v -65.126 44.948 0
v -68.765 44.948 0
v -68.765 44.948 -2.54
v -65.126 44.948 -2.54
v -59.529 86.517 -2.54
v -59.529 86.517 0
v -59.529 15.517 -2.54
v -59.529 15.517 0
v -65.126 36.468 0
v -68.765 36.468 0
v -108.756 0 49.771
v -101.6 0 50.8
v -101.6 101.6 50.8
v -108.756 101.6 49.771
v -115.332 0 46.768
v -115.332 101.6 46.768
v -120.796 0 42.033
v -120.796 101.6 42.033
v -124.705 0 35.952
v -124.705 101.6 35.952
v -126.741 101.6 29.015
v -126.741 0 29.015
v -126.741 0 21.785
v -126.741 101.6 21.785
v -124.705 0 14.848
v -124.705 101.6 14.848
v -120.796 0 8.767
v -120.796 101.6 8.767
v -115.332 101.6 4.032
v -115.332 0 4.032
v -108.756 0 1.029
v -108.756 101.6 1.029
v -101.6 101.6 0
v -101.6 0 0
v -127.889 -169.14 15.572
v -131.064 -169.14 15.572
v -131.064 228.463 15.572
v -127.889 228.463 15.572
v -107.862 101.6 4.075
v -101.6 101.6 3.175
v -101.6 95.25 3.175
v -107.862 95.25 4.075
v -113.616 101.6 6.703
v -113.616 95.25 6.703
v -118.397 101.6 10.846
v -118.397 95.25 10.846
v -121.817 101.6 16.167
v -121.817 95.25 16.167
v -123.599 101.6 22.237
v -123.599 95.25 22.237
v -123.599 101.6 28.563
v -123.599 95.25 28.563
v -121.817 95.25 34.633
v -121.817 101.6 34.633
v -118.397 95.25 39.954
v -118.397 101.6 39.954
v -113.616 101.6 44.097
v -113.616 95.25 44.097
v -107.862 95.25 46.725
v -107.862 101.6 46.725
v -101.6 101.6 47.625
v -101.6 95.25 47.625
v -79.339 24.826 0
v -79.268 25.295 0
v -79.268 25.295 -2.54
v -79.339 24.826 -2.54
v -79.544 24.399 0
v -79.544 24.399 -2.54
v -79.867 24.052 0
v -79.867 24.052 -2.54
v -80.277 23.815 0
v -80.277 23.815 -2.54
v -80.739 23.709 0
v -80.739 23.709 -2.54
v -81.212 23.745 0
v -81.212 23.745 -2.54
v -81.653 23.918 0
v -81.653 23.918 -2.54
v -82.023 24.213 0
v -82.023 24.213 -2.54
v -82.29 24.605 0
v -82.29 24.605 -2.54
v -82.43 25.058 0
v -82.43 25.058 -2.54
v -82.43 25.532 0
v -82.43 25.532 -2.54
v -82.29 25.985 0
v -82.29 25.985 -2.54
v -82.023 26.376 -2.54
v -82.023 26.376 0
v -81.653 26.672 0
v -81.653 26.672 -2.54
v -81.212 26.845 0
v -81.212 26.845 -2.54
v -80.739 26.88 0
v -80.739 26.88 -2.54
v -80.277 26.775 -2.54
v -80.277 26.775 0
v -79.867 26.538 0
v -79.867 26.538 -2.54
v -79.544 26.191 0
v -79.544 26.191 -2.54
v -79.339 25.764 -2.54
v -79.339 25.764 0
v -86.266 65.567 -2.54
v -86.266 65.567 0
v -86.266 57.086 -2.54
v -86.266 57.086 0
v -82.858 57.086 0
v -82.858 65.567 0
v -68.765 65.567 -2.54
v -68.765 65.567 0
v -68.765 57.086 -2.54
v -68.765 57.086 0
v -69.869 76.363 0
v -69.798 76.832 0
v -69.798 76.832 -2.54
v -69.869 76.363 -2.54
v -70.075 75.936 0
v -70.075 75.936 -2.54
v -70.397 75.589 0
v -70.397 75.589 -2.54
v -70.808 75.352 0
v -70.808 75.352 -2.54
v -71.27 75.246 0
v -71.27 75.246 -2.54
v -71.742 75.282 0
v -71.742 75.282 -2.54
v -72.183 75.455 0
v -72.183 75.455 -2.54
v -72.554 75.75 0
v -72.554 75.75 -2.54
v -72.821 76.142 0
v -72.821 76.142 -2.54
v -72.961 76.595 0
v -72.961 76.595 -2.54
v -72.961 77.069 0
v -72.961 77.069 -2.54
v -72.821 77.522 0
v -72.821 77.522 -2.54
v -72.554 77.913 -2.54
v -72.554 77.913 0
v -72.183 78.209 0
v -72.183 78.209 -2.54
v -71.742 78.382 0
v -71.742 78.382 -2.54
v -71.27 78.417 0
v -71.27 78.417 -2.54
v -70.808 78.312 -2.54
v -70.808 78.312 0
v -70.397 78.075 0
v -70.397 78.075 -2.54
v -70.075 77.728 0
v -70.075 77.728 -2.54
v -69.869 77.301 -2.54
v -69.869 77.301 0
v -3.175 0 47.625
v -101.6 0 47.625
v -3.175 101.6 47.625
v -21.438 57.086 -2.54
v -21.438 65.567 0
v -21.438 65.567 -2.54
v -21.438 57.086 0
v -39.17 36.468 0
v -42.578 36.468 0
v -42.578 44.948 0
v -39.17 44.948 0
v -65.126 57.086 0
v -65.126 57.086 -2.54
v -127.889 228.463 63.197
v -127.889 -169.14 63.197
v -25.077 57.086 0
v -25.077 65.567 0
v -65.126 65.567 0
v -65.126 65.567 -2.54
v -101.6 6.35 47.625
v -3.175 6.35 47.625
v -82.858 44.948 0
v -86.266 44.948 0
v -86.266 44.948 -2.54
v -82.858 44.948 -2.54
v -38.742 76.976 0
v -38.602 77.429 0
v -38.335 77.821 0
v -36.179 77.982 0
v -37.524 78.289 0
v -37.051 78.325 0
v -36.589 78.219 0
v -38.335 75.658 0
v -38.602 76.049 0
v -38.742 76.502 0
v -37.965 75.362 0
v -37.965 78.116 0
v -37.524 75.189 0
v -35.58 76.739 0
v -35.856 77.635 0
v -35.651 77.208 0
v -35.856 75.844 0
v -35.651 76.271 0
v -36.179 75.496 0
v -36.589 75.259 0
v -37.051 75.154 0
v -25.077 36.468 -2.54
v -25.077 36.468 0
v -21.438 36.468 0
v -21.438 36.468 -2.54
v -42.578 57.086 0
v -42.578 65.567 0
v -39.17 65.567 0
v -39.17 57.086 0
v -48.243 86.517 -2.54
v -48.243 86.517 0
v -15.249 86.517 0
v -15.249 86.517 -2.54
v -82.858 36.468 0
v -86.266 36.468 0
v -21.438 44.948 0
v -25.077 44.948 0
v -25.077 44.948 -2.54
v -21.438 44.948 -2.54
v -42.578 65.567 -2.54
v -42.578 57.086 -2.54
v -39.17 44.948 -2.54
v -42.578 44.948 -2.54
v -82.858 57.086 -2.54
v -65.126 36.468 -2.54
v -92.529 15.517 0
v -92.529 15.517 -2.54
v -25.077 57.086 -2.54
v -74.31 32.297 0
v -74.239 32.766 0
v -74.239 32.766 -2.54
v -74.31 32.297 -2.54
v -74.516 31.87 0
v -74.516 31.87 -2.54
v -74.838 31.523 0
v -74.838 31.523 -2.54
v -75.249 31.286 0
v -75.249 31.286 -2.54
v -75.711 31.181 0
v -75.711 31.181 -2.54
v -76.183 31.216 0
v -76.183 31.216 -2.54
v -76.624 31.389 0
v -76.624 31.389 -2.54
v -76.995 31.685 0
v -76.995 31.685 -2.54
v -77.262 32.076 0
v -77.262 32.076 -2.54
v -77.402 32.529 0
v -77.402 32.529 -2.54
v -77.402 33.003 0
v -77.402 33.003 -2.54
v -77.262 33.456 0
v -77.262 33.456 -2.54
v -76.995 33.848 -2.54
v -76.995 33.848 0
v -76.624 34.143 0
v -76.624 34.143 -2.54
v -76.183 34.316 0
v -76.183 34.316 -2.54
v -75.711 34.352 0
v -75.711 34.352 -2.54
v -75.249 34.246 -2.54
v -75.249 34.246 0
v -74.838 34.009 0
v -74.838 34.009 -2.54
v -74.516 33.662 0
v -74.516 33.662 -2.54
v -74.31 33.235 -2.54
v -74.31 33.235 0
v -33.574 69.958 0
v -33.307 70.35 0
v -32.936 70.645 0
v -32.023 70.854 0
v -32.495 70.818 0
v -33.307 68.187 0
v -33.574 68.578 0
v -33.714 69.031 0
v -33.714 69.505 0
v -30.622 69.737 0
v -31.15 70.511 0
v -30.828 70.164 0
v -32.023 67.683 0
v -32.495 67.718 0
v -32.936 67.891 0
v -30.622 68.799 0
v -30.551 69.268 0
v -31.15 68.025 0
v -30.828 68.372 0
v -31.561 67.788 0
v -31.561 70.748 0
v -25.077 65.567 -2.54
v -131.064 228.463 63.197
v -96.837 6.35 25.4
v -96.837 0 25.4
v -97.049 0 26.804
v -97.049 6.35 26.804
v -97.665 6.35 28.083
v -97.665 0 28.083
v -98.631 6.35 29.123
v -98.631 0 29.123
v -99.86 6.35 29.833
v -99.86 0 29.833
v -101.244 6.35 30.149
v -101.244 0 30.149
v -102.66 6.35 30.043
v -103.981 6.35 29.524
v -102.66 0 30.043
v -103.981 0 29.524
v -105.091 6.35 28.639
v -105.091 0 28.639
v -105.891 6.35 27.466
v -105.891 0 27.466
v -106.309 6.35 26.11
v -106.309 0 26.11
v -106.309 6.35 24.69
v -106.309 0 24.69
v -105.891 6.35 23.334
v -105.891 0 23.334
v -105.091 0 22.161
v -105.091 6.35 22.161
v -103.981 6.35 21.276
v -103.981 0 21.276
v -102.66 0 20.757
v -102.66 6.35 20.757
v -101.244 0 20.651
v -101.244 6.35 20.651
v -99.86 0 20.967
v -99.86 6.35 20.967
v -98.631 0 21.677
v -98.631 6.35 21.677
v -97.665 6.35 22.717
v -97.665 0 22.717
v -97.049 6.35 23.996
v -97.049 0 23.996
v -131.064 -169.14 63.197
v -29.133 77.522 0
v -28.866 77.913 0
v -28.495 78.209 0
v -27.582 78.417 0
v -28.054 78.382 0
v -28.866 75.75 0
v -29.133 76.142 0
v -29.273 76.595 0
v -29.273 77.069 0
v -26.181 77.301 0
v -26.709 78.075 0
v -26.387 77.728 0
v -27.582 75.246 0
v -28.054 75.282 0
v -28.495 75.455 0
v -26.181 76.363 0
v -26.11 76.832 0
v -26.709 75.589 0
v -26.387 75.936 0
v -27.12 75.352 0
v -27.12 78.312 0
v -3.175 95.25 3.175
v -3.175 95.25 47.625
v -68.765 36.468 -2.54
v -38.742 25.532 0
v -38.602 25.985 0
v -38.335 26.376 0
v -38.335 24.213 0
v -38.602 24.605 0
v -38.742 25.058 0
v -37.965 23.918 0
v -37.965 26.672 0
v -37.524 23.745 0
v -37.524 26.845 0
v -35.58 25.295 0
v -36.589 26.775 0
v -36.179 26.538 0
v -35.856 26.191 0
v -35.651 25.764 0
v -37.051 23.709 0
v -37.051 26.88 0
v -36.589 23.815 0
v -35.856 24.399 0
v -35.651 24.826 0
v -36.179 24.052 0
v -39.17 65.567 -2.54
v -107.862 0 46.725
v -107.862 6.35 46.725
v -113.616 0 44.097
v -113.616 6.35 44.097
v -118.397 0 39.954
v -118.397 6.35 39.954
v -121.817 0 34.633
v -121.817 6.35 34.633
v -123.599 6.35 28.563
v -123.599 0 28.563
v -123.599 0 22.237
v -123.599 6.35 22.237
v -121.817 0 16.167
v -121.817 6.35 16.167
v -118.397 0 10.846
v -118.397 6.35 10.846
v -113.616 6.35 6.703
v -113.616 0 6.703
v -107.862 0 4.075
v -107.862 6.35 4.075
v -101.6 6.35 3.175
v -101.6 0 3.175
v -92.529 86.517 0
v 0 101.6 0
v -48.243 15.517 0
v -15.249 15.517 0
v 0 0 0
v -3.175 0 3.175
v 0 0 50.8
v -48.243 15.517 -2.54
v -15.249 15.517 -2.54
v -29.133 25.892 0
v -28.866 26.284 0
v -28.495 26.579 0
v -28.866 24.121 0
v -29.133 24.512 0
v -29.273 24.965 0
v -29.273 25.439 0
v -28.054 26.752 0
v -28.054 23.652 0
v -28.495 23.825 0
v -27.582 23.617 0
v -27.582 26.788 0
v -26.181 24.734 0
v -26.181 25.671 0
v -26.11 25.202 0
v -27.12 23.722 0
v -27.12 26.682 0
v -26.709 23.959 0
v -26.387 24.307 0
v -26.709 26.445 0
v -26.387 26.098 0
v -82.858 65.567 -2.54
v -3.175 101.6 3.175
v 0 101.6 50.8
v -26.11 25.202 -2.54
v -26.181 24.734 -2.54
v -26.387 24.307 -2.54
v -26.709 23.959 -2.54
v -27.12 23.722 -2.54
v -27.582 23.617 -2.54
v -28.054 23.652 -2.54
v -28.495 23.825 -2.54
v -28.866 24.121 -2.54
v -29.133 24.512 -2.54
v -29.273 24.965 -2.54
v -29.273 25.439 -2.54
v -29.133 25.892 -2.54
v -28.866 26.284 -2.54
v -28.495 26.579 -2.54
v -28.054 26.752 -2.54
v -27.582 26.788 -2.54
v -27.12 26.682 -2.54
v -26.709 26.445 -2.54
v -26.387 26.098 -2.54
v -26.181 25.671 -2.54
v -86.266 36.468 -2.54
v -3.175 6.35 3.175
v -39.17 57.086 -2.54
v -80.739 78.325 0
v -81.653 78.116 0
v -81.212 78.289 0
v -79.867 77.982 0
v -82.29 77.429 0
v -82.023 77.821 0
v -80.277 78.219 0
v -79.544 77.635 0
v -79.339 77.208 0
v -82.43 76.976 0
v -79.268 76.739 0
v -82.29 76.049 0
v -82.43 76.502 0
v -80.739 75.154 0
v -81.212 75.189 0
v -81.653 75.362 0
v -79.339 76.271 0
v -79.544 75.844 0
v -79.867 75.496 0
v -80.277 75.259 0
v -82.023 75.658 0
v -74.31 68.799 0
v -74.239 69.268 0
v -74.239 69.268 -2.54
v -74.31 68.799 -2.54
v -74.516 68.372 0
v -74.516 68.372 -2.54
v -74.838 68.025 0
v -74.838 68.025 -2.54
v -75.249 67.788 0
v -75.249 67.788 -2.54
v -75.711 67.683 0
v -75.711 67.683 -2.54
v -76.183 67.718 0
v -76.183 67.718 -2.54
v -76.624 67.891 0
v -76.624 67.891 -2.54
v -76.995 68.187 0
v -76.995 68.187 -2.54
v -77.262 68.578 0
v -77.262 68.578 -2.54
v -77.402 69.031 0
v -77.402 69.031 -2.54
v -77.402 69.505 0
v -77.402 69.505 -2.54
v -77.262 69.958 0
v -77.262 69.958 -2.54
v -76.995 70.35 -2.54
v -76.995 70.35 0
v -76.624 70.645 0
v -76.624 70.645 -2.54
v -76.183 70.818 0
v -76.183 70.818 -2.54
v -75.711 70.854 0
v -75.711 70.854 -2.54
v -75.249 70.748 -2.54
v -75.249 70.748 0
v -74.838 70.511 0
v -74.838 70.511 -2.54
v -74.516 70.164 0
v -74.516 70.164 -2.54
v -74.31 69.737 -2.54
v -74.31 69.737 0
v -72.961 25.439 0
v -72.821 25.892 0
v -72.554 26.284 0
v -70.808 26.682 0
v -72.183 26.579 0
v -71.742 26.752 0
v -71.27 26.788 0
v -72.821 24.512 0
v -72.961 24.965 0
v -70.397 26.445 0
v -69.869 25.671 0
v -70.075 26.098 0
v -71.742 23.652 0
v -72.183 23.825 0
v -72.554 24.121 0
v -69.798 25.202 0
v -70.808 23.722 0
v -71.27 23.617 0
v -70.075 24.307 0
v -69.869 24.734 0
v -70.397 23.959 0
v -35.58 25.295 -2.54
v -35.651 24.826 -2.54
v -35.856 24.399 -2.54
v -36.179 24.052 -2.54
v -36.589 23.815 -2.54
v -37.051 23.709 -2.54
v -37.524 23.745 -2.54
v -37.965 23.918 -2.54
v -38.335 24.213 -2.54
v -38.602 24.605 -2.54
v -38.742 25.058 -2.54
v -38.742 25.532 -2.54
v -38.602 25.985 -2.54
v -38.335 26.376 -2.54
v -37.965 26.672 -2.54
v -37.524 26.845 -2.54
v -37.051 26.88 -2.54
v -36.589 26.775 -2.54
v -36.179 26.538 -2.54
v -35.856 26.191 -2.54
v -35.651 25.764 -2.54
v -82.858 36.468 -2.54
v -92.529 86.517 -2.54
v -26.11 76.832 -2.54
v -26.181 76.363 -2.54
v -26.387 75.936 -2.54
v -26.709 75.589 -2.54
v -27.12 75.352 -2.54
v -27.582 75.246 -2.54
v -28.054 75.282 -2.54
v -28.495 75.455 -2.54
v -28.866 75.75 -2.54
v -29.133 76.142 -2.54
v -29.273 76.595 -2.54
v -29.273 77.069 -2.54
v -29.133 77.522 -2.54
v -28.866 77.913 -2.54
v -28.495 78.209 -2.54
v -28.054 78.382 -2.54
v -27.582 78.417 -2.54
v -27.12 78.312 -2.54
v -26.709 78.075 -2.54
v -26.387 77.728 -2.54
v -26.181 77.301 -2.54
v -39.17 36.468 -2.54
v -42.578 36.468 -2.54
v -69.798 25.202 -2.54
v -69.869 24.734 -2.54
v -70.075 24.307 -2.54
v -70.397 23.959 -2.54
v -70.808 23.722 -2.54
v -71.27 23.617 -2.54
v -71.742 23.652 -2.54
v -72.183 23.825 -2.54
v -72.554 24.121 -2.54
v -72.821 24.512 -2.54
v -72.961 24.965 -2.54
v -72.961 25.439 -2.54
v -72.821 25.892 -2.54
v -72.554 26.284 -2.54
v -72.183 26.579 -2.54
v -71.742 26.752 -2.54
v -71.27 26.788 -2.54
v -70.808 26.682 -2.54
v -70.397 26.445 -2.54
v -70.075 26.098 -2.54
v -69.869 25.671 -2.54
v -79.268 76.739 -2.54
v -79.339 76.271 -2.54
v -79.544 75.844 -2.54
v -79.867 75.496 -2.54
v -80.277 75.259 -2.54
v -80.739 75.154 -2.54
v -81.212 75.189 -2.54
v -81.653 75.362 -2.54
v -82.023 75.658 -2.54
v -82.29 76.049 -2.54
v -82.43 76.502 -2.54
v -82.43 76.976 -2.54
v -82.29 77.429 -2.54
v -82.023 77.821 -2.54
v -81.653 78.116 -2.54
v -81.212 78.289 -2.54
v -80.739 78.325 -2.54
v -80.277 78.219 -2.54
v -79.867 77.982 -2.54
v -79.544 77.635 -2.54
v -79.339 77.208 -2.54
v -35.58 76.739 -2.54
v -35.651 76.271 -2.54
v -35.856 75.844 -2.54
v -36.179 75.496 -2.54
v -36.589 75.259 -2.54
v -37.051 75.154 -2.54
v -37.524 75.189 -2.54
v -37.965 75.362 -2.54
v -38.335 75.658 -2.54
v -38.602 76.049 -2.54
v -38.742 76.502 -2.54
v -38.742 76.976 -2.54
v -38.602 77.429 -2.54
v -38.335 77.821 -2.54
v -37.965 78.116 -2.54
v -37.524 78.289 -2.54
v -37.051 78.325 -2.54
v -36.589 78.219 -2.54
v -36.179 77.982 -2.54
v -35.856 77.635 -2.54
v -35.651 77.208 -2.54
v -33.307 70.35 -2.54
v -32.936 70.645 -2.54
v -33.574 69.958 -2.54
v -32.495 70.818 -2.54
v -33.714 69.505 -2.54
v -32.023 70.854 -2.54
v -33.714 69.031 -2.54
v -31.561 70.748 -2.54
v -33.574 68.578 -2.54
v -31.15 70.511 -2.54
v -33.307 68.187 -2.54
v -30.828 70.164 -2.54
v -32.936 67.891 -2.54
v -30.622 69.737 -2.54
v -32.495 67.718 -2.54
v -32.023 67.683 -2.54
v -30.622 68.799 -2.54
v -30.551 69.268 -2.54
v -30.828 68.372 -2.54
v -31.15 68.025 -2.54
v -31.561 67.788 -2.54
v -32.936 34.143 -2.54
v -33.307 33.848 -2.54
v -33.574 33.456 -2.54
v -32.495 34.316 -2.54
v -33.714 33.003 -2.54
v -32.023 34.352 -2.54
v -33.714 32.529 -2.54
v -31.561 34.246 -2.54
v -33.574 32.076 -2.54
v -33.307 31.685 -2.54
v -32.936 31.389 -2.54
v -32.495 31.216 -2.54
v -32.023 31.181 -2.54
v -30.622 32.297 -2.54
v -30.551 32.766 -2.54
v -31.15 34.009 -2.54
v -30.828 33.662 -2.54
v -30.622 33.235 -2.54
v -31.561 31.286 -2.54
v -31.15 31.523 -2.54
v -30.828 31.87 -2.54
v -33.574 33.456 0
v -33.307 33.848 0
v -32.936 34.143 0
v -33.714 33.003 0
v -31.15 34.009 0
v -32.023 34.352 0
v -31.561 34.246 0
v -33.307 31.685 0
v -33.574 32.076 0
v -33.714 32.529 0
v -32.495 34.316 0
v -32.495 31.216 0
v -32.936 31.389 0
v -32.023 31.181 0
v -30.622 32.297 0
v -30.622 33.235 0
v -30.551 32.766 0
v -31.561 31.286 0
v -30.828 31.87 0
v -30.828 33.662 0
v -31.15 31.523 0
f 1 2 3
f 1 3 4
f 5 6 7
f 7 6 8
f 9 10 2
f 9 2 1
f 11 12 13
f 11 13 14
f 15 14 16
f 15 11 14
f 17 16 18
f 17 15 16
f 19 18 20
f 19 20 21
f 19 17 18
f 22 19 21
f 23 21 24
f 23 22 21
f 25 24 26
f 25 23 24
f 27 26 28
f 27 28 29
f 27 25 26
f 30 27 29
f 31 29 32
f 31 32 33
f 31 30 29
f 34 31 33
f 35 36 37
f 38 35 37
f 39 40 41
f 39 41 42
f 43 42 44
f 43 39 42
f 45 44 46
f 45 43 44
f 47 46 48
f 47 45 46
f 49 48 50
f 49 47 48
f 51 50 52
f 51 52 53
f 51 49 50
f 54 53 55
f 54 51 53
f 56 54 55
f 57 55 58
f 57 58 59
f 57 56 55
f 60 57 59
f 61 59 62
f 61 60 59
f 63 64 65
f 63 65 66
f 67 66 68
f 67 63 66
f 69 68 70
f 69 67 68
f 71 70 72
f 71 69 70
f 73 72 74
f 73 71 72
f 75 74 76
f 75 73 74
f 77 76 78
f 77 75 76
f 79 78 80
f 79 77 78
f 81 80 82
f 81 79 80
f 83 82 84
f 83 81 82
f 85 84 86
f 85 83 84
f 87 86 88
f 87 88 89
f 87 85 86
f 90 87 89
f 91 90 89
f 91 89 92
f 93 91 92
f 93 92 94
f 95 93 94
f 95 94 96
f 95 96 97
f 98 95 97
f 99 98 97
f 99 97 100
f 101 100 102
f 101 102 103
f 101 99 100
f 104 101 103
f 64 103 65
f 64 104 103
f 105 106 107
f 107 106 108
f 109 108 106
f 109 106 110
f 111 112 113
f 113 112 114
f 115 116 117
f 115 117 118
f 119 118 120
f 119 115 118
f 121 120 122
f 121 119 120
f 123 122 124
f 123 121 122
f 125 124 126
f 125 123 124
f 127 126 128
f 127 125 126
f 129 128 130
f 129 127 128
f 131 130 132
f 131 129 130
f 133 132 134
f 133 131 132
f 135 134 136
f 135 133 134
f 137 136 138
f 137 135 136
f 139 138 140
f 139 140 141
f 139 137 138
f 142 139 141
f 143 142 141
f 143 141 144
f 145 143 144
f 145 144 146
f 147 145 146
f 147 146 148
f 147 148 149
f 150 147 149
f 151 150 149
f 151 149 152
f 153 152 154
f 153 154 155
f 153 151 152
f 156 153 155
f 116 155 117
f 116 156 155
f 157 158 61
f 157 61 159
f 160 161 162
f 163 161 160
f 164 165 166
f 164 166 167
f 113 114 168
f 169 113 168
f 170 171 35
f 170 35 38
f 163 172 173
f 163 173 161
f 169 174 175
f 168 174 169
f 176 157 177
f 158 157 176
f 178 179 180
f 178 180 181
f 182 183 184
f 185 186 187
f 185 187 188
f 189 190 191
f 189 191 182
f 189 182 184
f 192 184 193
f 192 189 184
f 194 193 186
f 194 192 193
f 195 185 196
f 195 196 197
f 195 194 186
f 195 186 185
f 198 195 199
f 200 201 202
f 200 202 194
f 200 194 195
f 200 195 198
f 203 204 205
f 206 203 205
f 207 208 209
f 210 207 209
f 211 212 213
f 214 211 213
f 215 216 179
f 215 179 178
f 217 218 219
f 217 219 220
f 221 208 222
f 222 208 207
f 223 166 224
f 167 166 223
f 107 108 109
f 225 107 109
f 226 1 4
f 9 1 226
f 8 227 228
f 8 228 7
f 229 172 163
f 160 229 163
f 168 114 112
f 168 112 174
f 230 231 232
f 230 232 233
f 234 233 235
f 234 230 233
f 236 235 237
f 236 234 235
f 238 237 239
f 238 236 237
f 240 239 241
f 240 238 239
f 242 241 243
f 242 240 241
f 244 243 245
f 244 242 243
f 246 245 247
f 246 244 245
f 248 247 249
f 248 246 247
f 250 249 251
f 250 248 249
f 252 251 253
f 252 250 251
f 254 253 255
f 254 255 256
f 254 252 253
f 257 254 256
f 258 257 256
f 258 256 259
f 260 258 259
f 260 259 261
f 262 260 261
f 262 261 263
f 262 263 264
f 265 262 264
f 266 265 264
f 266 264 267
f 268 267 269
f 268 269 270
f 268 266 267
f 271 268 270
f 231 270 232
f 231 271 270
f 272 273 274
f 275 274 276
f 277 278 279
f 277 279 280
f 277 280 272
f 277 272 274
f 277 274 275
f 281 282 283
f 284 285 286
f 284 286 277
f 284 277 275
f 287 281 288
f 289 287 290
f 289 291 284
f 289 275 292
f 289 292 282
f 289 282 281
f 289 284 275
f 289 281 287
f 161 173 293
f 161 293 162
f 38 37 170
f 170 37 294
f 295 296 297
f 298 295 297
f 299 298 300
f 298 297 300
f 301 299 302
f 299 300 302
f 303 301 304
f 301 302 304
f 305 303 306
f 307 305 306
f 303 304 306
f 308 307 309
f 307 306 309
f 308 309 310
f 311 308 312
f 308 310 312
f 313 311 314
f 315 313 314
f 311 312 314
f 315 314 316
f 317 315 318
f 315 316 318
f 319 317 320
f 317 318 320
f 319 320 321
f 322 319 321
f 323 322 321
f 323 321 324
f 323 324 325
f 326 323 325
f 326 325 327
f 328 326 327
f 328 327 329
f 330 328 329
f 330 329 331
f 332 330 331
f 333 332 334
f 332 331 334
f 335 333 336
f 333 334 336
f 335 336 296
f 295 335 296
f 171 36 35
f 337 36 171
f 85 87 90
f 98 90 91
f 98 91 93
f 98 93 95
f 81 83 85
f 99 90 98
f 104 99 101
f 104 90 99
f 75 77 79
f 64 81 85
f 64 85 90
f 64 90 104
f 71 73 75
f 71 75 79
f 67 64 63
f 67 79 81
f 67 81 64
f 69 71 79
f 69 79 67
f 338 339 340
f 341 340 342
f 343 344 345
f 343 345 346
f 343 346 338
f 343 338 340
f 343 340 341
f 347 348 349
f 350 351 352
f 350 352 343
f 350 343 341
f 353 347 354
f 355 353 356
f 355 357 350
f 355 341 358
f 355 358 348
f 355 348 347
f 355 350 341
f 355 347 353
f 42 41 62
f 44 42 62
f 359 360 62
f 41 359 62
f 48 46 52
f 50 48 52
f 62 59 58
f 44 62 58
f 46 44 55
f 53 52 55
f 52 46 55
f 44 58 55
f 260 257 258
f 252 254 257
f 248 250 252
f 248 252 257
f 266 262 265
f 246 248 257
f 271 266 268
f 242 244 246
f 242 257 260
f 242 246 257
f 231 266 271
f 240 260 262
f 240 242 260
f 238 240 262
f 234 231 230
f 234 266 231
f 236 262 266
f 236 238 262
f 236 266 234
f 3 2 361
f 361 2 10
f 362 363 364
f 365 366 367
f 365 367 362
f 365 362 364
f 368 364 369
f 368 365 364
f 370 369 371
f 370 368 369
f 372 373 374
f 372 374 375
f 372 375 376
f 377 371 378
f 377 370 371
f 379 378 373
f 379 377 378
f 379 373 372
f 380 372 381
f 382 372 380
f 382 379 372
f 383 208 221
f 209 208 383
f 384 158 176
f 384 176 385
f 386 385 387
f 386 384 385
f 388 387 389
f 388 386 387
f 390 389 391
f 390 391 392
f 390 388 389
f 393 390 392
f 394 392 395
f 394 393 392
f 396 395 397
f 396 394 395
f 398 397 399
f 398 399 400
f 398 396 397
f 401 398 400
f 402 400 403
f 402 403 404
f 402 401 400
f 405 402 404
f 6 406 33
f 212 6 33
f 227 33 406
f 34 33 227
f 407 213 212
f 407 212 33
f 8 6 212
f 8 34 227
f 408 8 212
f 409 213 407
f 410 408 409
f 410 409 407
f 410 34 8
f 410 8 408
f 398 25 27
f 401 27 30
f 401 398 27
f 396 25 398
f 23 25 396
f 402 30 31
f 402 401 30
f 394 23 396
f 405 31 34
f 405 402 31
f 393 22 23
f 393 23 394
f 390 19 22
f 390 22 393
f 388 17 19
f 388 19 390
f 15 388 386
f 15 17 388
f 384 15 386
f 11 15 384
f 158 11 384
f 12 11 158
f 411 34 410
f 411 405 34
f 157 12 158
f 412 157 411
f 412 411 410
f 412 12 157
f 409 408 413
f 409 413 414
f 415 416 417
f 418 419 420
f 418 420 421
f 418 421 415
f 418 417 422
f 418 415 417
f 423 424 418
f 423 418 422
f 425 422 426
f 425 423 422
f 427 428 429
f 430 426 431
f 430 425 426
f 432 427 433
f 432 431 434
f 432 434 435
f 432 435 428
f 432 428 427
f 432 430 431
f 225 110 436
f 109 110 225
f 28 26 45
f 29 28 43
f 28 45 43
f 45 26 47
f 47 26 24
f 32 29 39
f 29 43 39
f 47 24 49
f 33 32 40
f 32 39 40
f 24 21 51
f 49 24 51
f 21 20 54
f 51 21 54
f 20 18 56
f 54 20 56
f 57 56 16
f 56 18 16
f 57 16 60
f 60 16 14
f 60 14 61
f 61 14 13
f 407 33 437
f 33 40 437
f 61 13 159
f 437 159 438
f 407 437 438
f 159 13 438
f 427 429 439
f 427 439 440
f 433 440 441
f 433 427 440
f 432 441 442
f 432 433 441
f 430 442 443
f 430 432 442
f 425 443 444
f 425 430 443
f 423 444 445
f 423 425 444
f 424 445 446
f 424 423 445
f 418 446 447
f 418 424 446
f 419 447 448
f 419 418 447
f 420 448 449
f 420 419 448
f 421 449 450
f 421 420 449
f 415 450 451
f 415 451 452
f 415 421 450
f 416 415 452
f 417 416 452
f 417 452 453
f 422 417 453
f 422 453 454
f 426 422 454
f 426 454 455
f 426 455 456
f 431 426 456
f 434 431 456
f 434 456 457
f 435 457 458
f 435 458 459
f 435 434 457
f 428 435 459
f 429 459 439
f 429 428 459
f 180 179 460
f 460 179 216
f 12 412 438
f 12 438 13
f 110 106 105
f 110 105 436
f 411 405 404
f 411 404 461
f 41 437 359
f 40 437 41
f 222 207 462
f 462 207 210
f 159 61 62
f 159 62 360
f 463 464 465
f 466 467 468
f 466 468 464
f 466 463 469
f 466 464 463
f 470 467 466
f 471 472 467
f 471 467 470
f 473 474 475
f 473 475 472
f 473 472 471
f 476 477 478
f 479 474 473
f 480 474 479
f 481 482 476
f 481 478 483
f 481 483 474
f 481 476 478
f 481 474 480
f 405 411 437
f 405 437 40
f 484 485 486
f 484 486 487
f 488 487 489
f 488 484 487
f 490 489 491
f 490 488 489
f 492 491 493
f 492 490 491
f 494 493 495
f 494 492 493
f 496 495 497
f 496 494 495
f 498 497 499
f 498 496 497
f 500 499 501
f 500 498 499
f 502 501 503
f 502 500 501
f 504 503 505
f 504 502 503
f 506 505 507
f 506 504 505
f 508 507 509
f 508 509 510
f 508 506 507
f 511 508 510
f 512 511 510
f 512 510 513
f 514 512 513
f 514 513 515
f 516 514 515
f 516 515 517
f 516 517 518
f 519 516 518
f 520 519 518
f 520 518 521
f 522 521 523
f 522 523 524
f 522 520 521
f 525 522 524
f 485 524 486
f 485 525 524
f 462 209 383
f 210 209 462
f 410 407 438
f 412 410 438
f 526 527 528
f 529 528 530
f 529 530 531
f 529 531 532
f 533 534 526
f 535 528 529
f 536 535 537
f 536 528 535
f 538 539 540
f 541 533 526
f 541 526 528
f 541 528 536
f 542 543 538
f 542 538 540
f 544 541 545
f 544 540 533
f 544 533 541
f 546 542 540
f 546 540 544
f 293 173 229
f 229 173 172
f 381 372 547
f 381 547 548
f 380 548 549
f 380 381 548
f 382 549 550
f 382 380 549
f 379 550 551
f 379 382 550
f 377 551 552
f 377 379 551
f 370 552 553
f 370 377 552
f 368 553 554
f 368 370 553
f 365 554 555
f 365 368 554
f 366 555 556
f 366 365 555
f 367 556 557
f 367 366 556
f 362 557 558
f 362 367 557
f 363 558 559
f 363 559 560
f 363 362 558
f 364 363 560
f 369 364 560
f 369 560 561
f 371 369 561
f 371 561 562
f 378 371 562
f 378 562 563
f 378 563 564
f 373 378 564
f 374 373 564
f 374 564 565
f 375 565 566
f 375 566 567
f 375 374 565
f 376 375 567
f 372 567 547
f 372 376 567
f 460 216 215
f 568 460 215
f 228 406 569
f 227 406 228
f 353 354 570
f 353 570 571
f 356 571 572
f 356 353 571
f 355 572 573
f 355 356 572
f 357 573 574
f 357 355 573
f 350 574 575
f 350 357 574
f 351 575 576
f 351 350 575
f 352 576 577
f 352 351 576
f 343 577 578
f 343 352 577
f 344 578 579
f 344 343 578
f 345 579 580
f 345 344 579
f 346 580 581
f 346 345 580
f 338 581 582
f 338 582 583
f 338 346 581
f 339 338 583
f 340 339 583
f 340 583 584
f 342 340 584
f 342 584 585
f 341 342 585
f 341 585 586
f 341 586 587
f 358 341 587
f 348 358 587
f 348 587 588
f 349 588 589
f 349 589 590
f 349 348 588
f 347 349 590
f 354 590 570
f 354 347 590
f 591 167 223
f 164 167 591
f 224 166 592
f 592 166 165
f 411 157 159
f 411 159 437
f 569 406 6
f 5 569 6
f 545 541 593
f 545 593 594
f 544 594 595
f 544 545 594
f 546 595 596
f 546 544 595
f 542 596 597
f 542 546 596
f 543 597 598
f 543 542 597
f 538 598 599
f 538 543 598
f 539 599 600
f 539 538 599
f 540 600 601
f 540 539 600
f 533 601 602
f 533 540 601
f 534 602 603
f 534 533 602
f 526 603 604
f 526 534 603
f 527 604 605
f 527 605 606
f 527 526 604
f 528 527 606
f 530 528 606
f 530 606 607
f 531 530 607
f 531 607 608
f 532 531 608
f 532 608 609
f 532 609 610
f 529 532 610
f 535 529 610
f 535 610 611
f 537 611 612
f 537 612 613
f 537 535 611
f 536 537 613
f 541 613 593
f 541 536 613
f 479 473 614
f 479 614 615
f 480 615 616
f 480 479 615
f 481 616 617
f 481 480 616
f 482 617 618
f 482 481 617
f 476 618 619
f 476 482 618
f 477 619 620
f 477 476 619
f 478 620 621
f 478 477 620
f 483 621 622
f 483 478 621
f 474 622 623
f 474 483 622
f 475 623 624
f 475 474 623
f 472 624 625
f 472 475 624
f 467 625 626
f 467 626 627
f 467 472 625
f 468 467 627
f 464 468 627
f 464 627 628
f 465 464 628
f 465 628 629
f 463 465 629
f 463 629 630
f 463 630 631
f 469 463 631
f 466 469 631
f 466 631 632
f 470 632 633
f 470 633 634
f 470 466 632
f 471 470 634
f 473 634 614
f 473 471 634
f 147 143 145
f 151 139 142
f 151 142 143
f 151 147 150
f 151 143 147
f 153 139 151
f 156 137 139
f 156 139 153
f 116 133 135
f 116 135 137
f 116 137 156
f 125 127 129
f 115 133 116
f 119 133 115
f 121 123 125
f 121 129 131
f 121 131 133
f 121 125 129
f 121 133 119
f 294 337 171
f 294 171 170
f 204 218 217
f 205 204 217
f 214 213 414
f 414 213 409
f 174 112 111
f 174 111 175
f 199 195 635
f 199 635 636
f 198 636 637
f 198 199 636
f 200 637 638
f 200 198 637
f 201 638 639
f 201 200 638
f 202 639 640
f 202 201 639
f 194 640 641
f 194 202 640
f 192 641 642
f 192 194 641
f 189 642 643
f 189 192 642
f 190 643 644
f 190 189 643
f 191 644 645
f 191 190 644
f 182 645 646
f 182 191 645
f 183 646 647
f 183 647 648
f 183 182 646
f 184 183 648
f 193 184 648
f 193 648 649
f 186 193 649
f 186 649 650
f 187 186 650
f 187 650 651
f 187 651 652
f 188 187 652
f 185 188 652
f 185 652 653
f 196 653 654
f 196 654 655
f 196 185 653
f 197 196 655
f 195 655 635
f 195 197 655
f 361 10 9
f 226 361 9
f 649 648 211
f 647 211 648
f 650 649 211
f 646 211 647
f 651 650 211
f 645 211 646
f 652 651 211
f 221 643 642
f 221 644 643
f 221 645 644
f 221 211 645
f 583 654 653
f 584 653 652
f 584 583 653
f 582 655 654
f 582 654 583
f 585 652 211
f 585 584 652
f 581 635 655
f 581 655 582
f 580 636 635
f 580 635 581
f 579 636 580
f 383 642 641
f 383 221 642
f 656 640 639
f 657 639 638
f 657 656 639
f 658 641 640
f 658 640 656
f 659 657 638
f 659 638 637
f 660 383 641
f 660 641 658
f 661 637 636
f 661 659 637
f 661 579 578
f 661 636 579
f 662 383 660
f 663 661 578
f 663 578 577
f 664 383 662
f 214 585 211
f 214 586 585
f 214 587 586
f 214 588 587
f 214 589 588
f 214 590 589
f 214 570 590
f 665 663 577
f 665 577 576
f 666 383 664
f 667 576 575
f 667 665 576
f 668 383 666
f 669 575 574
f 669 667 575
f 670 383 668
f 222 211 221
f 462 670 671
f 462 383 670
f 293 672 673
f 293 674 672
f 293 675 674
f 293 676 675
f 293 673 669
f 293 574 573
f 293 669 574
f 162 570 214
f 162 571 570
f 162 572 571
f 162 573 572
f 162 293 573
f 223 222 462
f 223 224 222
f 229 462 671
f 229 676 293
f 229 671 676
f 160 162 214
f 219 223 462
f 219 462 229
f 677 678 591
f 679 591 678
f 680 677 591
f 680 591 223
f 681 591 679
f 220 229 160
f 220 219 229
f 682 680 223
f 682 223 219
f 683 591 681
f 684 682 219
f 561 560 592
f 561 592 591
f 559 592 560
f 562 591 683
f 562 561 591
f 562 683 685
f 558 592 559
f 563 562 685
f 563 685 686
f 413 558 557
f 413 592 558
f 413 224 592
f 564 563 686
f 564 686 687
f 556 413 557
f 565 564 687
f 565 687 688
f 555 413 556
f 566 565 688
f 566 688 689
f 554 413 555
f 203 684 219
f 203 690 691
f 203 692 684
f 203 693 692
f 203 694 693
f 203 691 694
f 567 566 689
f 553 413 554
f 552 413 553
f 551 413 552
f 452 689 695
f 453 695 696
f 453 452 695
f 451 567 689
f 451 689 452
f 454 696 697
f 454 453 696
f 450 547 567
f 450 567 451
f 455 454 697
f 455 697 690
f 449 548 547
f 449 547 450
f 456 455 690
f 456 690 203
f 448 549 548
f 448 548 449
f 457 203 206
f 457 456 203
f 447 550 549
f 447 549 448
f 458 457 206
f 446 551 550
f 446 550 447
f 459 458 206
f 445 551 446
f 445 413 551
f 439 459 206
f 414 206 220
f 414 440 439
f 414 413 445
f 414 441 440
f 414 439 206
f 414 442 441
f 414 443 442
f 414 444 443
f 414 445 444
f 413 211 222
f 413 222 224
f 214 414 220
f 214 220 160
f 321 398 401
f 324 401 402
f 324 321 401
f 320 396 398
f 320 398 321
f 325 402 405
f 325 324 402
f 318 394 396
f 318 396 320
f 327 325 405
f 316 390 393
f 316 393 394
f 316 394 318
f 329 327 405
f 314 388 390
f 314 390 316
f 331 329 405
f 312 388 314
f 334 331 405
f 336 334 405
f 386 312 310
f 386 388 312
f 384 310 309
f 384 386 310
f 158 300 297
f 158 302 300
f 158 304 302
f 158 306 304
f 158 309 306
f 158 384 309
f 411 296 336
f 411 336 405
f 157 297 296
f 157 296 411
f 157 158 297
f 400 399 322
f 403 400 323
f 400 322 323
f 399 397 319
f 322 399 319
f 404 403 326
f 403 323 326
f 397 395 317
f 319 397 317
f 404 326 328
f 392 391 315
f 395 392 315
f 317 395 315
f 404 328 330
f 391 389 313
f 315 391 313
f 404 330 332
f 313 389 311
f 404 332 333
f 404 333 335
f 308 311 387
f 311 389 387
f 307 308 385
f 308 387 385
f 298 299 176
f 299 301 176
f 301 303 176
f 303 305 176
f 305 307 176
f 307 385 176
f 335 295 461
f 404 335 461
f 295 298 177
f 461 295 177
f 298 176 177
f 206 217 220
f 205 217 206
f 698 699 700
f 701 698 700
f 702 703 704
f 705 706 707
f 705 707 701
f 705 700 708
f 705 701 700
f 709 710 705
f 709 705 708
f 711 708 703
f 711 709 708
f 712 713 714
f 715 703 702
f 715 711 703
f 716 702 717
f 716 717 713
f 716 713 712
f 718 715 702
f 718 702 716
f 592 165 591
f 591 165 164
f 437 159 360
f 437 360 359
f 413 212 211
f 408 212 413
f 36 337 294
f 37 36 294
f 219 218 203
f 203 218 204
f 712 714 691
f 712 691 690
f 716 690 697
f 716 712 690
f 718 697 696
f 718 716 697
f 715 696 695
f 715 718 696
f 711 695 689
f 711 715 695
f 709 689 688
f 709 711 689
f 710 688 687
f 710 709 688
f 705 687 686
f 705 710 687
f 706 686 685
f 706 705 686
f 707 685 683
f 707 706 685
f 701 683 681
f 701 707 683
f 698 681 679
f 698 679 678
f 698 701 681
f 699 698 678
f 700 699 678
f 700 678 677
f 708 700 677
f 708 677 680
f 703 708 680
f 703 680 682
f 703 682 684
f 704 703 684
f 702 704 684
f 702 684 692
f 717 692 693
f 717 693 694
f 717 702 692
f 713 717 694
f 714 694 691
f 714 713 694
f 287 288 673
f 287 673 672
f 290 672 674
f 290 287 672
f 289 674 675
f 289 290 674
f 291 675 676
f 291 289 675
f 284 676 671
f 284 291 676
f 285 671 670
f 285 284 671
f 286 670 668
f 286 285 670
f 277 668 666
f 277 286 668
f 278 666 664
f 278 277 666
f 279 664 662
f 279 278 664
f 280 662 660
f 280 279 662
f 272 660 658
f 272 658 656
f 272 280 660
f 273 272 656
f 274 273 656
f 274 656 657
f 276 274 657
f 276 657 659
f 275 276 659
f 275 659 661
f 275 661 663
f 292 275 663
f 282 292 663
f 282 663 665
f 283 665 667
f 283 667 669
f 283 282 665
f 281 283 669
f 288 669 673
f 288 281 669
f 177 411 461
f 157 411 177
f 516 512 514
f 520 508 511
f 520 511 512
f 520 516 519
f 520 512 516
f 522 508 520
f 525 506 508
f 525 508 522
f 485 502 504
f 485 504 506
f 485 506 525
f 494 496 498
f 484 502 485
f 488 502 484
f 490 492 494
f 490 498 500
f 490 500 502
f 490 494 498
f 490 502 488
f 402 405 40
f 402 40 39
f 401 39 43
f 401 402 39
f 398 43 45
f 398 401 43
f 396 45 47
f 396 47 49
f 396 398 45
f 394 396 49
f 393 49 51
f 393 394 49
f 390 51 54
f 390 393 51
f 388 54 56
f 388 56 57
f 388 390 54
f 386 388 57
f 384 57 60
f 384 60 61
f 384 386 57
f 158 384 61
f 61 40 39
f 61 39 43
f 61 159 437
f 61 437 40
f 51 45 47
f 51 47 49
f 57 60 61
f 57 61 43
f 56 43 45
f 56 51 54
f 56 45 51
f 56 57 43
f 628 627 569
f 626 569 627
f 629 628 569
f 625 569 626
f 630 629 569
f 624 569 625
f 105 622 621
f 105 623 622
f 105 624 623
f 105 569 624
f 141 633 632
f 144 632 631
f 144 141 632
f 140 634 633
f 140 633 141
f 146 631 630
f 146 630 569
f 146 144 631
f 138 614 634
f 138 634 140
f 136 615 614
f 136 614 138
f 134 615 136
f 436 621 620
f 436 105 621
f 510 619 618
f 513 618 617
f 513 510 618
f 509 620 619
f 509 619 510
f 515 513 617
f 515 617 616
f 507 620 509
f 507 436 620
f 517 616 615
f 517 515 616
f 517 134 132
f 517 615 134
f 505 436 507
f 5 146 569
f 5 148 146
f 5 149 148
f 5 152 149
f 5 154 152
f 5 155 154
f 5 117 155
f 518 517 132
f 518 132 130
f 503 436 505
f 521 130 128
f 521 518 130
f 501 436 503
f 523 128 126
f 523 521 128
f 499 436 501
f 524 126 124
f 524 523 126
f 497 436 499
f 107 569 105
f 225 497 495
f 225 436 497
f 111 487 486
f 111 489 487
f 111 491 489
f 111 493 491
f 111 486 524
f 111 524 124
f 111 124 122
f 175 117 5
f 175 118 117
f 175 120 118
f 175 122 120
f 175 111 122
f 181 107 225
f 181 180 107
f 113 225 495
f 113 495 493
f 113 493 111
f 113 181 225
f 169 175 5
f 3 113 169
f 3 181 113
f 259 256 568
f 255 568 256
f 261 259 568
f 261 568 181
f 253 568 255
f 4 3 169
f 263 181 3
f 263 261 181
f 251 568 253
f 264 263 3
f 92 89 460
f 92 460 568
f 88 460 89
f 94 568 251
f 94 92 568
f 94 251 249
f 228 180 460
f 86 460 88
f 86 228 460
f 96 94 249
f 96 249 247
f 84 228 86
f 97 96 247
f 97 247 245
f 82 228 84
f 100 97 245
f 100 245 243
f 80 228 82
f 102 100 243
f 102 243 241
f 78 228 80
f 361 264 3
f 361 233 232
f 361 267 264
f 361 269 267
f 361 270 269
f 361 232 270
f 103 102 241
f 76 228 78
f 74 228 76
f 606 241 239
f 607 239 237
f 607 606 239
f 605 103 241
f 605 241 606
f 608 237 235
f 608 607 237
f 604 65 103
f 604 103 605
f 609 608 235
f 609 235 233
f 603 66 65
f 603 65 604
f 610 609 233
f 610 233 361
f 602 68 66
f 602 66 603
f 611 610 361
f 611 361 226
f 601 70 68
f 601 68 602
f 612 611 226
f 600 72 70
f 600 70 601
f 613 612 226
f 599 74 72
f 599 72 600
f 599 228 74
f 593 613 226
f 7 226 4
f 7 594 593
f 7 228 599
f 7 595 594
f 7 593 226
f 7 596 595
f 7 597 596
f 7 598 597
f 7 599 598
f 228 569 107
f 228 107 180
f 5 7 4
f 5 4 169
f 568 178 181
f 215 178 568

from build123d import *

# Parameters (mm, degrees)
F1_DEPTH  = 101.6
F0_R      = 4.7625
F2_DEPTH  = 6.35
F4_DEPTH  = 6.35
F5_W      = 33
F5_H      = 71
F5_R      = 1.5899856631
F5_W_2    = 3.4081563354
F5_H_2    = 8.4805563092
F5_W_3    = 3.6386847496
F5_W_4    = 32.9946
F6_DEPTH  = 2.54
F7_DEPTH  = 152.4
F9_W      = 397.6023276476
F9_H      = 47.625
F10_DEPTH = 3.175


with BuildPart() as f1:
    # F0 (on Front) → F1 (new body)
    with BuildSketch(Plane.XZ):
        with BuildLine():
            Line((-101.6, 0), (0, 0))
            Line((0, 0), (0, 50.8))
            Line((0, 50.8), (-101.6, 50.8))
            ThreePointArc((-101.6, 50.8), (-127, 25.4), (-101.6, 0))
        make_face()
        with BuildLine():
            ThreePointArc((-101.6, 3.175), (-123.825, 25.4), (-101.6, 47.625))
            Line((-101.6, 47.625), (-3.175, 47.625))
            Line((-3.175, 47.625), (-3.175, 3.175))
            Line((-3.175, 3.175), (-101.6, 3.175))
        make_face(mode=Mode.SUBTRACT)
    extrude(amount=-F1_DEPTH)

    # F5 (on face) → F6 (join)
    with BuildSketch(Plane(origin=(0, 0, 0), x_dir=(1, 0, 0), z_dir=(0, 0, -1))):
        with Locations((-76.0293341279, -51.0171295628)):
            Rectangle(F5_W, F5_H)
        with Locations((-80.857872963, -76.7393182069)):
            Circle(F5_R, mode=Mode.SUBTRACT)
        with Locations((-71.3884010911, -76.8319158852)):
            Circle(F5_R, mode=Mode.SUBTRACT)
        with Locations((-84.5616646111, -61.3264138848)):
            Rectangle(F5_W_2, F5_H_2, mode=Mode.SUBTRACT)
        with Locations((-75.8294463158, -69.2681442052)):
            Circle(F5_R, mode=Mode.SUBTRACT)
        with Locations((-66.9453144073, -61.3264138848)):
            Rectangle(F5_W_3, F5_H_2, mode=Mode.SUBTRACT)
        with Locations((-84.5616646111, -40.7078452408)):
            Rectangle(F5_W_2, F5_H_2, mode=Mode.SUBTRACT)
        with Locations((-66.9453144073, -40.7078452408)):
            Rectangle(F5_W_3, F5_H_2, mode=Mode.SUBTRACT)
        with Locations((-75.8294463158, -32.7661149204)):
            Circle(F5_R, mode=Mode.SUBTRACT)
        with Locations((-80.857872963, -25.2949409187)):
            Circle(F5_R, mode=Mode.SUBTRACT)
        with Locations((-71.3884010911, -25.2023432404)):
            Circle(F5_R, mode=Mode.SUBTRACT)
        with Locations((-31.7460363795, -51.0171295628)):
            Rectangle(F5_W_4, F5_H)
        with Locations((-37.169872963, -76.7393182069)):
            Circle(F5_R, mode=Mode.SUBTRACT)
        with Locations((-27.7004010911, -76.8319158852)):
            Circle(F5_R, mode=Mode.SUBTRACT)
        with Locations((-32.1414463158, -69.2681442052)):
            Circle(F5_R, mode=Mode.SUBTRACT)
        with Locations((-40.8736646111, -61.3264138848)):
            Rectangle(F5_W_2, F5_H_2, mode=Mode.SUBTRACT)
        with Locations((-23.2573144073, -61.3264138848)):
            Rectangle(F5_W_3, F5_H_2, mode=Mode.SUBTRACT)
        with Locations((-40.8736646111, -40.7078452408)):
            Rectangle(F5_W_2, F5_H_2, mode=Mode.SUBTRACT)
        with Locations((-32.1414463158, -32.7661149204)):
            Circle(F5_R, mode=Mode.SUBTRACT)
        with Locations((-23.2573144073, -40.7078452408)):
            Rectangle(F5_W_3, F5_H_2, mode=Mode.SUBTRACT)
        with Locations((-37.169872963, -25.2949409187)):
            Circle(F5_R, mode=Mode.SUBTRACT)
        with Locations((-27.7004010911, -25.2023432404)):
            Circle(F5_R, mode=Mode.SUBTRACT)
    extrude(amount=F6_DEPTH)

    # F0 (on Front) → F7 (cut)
    with BuildSketch(Plane.XZ):
        with Locations((-101.6, 25.4)):
            Circle(F0_R)
    extrude(amount=F7_DEPTH, mode=Mode.SUBTRACT)


with BuildPart() as f2:
    # F0 (on Front) → F2 (new body)
    with BuildSketch(Plane.XZ):
        with BuildLine():
            Line((-3.175, 47.625), (-101.6, 47.625))
            ThreePointArc((-101.6, 47.625), (-123.825, 25.4), (-101.6, 3.175))
            Line((-101.6, 3.175), (-3.175, 3.175))
            Line((-3.175, 3.175), (-3.175, 47.625))
        make_face()
        with Locations((-101.6, 25.4)):
            Circle(F0_R, mode=Mode.SUBTRACT)
    extrude(amount=-F2_DEPTH)


with BuildPart() as f4:
    # F3 (on face) → F4 (new body)
    with BuildSketch(Plane(origin=(0, 101.6, 0), x_dir=(-1, 0, 0), z_dir=(0, 1, 0))):
        with BuildLine():
            ThreePointArc((101.6, 3.175), (123.825, 25.4), (101.6, 47.625))
            Line((101.6, 47.625), (3.175, 47.625))
            Line((3.175, 47.625), (3.175, 3.175))
            Line((3.175, 3.175), (101.6, 3.175))
        make_face()
    extrude(amount=-F4_DEPTH)


with BuildPart() as f10:
    # F9 (on offset) → F10 (new body)
    with BuildSketch(Plane.YZ.offset(-131.064)):
        with Locations((29.6614095569, 39.3848596141)):
            Rectangle(F9_W, F9_H)
    extrude(amount=F10_DEPTH)


solid = Compound([f1.part, f2.part, f4.part, f10.part])
